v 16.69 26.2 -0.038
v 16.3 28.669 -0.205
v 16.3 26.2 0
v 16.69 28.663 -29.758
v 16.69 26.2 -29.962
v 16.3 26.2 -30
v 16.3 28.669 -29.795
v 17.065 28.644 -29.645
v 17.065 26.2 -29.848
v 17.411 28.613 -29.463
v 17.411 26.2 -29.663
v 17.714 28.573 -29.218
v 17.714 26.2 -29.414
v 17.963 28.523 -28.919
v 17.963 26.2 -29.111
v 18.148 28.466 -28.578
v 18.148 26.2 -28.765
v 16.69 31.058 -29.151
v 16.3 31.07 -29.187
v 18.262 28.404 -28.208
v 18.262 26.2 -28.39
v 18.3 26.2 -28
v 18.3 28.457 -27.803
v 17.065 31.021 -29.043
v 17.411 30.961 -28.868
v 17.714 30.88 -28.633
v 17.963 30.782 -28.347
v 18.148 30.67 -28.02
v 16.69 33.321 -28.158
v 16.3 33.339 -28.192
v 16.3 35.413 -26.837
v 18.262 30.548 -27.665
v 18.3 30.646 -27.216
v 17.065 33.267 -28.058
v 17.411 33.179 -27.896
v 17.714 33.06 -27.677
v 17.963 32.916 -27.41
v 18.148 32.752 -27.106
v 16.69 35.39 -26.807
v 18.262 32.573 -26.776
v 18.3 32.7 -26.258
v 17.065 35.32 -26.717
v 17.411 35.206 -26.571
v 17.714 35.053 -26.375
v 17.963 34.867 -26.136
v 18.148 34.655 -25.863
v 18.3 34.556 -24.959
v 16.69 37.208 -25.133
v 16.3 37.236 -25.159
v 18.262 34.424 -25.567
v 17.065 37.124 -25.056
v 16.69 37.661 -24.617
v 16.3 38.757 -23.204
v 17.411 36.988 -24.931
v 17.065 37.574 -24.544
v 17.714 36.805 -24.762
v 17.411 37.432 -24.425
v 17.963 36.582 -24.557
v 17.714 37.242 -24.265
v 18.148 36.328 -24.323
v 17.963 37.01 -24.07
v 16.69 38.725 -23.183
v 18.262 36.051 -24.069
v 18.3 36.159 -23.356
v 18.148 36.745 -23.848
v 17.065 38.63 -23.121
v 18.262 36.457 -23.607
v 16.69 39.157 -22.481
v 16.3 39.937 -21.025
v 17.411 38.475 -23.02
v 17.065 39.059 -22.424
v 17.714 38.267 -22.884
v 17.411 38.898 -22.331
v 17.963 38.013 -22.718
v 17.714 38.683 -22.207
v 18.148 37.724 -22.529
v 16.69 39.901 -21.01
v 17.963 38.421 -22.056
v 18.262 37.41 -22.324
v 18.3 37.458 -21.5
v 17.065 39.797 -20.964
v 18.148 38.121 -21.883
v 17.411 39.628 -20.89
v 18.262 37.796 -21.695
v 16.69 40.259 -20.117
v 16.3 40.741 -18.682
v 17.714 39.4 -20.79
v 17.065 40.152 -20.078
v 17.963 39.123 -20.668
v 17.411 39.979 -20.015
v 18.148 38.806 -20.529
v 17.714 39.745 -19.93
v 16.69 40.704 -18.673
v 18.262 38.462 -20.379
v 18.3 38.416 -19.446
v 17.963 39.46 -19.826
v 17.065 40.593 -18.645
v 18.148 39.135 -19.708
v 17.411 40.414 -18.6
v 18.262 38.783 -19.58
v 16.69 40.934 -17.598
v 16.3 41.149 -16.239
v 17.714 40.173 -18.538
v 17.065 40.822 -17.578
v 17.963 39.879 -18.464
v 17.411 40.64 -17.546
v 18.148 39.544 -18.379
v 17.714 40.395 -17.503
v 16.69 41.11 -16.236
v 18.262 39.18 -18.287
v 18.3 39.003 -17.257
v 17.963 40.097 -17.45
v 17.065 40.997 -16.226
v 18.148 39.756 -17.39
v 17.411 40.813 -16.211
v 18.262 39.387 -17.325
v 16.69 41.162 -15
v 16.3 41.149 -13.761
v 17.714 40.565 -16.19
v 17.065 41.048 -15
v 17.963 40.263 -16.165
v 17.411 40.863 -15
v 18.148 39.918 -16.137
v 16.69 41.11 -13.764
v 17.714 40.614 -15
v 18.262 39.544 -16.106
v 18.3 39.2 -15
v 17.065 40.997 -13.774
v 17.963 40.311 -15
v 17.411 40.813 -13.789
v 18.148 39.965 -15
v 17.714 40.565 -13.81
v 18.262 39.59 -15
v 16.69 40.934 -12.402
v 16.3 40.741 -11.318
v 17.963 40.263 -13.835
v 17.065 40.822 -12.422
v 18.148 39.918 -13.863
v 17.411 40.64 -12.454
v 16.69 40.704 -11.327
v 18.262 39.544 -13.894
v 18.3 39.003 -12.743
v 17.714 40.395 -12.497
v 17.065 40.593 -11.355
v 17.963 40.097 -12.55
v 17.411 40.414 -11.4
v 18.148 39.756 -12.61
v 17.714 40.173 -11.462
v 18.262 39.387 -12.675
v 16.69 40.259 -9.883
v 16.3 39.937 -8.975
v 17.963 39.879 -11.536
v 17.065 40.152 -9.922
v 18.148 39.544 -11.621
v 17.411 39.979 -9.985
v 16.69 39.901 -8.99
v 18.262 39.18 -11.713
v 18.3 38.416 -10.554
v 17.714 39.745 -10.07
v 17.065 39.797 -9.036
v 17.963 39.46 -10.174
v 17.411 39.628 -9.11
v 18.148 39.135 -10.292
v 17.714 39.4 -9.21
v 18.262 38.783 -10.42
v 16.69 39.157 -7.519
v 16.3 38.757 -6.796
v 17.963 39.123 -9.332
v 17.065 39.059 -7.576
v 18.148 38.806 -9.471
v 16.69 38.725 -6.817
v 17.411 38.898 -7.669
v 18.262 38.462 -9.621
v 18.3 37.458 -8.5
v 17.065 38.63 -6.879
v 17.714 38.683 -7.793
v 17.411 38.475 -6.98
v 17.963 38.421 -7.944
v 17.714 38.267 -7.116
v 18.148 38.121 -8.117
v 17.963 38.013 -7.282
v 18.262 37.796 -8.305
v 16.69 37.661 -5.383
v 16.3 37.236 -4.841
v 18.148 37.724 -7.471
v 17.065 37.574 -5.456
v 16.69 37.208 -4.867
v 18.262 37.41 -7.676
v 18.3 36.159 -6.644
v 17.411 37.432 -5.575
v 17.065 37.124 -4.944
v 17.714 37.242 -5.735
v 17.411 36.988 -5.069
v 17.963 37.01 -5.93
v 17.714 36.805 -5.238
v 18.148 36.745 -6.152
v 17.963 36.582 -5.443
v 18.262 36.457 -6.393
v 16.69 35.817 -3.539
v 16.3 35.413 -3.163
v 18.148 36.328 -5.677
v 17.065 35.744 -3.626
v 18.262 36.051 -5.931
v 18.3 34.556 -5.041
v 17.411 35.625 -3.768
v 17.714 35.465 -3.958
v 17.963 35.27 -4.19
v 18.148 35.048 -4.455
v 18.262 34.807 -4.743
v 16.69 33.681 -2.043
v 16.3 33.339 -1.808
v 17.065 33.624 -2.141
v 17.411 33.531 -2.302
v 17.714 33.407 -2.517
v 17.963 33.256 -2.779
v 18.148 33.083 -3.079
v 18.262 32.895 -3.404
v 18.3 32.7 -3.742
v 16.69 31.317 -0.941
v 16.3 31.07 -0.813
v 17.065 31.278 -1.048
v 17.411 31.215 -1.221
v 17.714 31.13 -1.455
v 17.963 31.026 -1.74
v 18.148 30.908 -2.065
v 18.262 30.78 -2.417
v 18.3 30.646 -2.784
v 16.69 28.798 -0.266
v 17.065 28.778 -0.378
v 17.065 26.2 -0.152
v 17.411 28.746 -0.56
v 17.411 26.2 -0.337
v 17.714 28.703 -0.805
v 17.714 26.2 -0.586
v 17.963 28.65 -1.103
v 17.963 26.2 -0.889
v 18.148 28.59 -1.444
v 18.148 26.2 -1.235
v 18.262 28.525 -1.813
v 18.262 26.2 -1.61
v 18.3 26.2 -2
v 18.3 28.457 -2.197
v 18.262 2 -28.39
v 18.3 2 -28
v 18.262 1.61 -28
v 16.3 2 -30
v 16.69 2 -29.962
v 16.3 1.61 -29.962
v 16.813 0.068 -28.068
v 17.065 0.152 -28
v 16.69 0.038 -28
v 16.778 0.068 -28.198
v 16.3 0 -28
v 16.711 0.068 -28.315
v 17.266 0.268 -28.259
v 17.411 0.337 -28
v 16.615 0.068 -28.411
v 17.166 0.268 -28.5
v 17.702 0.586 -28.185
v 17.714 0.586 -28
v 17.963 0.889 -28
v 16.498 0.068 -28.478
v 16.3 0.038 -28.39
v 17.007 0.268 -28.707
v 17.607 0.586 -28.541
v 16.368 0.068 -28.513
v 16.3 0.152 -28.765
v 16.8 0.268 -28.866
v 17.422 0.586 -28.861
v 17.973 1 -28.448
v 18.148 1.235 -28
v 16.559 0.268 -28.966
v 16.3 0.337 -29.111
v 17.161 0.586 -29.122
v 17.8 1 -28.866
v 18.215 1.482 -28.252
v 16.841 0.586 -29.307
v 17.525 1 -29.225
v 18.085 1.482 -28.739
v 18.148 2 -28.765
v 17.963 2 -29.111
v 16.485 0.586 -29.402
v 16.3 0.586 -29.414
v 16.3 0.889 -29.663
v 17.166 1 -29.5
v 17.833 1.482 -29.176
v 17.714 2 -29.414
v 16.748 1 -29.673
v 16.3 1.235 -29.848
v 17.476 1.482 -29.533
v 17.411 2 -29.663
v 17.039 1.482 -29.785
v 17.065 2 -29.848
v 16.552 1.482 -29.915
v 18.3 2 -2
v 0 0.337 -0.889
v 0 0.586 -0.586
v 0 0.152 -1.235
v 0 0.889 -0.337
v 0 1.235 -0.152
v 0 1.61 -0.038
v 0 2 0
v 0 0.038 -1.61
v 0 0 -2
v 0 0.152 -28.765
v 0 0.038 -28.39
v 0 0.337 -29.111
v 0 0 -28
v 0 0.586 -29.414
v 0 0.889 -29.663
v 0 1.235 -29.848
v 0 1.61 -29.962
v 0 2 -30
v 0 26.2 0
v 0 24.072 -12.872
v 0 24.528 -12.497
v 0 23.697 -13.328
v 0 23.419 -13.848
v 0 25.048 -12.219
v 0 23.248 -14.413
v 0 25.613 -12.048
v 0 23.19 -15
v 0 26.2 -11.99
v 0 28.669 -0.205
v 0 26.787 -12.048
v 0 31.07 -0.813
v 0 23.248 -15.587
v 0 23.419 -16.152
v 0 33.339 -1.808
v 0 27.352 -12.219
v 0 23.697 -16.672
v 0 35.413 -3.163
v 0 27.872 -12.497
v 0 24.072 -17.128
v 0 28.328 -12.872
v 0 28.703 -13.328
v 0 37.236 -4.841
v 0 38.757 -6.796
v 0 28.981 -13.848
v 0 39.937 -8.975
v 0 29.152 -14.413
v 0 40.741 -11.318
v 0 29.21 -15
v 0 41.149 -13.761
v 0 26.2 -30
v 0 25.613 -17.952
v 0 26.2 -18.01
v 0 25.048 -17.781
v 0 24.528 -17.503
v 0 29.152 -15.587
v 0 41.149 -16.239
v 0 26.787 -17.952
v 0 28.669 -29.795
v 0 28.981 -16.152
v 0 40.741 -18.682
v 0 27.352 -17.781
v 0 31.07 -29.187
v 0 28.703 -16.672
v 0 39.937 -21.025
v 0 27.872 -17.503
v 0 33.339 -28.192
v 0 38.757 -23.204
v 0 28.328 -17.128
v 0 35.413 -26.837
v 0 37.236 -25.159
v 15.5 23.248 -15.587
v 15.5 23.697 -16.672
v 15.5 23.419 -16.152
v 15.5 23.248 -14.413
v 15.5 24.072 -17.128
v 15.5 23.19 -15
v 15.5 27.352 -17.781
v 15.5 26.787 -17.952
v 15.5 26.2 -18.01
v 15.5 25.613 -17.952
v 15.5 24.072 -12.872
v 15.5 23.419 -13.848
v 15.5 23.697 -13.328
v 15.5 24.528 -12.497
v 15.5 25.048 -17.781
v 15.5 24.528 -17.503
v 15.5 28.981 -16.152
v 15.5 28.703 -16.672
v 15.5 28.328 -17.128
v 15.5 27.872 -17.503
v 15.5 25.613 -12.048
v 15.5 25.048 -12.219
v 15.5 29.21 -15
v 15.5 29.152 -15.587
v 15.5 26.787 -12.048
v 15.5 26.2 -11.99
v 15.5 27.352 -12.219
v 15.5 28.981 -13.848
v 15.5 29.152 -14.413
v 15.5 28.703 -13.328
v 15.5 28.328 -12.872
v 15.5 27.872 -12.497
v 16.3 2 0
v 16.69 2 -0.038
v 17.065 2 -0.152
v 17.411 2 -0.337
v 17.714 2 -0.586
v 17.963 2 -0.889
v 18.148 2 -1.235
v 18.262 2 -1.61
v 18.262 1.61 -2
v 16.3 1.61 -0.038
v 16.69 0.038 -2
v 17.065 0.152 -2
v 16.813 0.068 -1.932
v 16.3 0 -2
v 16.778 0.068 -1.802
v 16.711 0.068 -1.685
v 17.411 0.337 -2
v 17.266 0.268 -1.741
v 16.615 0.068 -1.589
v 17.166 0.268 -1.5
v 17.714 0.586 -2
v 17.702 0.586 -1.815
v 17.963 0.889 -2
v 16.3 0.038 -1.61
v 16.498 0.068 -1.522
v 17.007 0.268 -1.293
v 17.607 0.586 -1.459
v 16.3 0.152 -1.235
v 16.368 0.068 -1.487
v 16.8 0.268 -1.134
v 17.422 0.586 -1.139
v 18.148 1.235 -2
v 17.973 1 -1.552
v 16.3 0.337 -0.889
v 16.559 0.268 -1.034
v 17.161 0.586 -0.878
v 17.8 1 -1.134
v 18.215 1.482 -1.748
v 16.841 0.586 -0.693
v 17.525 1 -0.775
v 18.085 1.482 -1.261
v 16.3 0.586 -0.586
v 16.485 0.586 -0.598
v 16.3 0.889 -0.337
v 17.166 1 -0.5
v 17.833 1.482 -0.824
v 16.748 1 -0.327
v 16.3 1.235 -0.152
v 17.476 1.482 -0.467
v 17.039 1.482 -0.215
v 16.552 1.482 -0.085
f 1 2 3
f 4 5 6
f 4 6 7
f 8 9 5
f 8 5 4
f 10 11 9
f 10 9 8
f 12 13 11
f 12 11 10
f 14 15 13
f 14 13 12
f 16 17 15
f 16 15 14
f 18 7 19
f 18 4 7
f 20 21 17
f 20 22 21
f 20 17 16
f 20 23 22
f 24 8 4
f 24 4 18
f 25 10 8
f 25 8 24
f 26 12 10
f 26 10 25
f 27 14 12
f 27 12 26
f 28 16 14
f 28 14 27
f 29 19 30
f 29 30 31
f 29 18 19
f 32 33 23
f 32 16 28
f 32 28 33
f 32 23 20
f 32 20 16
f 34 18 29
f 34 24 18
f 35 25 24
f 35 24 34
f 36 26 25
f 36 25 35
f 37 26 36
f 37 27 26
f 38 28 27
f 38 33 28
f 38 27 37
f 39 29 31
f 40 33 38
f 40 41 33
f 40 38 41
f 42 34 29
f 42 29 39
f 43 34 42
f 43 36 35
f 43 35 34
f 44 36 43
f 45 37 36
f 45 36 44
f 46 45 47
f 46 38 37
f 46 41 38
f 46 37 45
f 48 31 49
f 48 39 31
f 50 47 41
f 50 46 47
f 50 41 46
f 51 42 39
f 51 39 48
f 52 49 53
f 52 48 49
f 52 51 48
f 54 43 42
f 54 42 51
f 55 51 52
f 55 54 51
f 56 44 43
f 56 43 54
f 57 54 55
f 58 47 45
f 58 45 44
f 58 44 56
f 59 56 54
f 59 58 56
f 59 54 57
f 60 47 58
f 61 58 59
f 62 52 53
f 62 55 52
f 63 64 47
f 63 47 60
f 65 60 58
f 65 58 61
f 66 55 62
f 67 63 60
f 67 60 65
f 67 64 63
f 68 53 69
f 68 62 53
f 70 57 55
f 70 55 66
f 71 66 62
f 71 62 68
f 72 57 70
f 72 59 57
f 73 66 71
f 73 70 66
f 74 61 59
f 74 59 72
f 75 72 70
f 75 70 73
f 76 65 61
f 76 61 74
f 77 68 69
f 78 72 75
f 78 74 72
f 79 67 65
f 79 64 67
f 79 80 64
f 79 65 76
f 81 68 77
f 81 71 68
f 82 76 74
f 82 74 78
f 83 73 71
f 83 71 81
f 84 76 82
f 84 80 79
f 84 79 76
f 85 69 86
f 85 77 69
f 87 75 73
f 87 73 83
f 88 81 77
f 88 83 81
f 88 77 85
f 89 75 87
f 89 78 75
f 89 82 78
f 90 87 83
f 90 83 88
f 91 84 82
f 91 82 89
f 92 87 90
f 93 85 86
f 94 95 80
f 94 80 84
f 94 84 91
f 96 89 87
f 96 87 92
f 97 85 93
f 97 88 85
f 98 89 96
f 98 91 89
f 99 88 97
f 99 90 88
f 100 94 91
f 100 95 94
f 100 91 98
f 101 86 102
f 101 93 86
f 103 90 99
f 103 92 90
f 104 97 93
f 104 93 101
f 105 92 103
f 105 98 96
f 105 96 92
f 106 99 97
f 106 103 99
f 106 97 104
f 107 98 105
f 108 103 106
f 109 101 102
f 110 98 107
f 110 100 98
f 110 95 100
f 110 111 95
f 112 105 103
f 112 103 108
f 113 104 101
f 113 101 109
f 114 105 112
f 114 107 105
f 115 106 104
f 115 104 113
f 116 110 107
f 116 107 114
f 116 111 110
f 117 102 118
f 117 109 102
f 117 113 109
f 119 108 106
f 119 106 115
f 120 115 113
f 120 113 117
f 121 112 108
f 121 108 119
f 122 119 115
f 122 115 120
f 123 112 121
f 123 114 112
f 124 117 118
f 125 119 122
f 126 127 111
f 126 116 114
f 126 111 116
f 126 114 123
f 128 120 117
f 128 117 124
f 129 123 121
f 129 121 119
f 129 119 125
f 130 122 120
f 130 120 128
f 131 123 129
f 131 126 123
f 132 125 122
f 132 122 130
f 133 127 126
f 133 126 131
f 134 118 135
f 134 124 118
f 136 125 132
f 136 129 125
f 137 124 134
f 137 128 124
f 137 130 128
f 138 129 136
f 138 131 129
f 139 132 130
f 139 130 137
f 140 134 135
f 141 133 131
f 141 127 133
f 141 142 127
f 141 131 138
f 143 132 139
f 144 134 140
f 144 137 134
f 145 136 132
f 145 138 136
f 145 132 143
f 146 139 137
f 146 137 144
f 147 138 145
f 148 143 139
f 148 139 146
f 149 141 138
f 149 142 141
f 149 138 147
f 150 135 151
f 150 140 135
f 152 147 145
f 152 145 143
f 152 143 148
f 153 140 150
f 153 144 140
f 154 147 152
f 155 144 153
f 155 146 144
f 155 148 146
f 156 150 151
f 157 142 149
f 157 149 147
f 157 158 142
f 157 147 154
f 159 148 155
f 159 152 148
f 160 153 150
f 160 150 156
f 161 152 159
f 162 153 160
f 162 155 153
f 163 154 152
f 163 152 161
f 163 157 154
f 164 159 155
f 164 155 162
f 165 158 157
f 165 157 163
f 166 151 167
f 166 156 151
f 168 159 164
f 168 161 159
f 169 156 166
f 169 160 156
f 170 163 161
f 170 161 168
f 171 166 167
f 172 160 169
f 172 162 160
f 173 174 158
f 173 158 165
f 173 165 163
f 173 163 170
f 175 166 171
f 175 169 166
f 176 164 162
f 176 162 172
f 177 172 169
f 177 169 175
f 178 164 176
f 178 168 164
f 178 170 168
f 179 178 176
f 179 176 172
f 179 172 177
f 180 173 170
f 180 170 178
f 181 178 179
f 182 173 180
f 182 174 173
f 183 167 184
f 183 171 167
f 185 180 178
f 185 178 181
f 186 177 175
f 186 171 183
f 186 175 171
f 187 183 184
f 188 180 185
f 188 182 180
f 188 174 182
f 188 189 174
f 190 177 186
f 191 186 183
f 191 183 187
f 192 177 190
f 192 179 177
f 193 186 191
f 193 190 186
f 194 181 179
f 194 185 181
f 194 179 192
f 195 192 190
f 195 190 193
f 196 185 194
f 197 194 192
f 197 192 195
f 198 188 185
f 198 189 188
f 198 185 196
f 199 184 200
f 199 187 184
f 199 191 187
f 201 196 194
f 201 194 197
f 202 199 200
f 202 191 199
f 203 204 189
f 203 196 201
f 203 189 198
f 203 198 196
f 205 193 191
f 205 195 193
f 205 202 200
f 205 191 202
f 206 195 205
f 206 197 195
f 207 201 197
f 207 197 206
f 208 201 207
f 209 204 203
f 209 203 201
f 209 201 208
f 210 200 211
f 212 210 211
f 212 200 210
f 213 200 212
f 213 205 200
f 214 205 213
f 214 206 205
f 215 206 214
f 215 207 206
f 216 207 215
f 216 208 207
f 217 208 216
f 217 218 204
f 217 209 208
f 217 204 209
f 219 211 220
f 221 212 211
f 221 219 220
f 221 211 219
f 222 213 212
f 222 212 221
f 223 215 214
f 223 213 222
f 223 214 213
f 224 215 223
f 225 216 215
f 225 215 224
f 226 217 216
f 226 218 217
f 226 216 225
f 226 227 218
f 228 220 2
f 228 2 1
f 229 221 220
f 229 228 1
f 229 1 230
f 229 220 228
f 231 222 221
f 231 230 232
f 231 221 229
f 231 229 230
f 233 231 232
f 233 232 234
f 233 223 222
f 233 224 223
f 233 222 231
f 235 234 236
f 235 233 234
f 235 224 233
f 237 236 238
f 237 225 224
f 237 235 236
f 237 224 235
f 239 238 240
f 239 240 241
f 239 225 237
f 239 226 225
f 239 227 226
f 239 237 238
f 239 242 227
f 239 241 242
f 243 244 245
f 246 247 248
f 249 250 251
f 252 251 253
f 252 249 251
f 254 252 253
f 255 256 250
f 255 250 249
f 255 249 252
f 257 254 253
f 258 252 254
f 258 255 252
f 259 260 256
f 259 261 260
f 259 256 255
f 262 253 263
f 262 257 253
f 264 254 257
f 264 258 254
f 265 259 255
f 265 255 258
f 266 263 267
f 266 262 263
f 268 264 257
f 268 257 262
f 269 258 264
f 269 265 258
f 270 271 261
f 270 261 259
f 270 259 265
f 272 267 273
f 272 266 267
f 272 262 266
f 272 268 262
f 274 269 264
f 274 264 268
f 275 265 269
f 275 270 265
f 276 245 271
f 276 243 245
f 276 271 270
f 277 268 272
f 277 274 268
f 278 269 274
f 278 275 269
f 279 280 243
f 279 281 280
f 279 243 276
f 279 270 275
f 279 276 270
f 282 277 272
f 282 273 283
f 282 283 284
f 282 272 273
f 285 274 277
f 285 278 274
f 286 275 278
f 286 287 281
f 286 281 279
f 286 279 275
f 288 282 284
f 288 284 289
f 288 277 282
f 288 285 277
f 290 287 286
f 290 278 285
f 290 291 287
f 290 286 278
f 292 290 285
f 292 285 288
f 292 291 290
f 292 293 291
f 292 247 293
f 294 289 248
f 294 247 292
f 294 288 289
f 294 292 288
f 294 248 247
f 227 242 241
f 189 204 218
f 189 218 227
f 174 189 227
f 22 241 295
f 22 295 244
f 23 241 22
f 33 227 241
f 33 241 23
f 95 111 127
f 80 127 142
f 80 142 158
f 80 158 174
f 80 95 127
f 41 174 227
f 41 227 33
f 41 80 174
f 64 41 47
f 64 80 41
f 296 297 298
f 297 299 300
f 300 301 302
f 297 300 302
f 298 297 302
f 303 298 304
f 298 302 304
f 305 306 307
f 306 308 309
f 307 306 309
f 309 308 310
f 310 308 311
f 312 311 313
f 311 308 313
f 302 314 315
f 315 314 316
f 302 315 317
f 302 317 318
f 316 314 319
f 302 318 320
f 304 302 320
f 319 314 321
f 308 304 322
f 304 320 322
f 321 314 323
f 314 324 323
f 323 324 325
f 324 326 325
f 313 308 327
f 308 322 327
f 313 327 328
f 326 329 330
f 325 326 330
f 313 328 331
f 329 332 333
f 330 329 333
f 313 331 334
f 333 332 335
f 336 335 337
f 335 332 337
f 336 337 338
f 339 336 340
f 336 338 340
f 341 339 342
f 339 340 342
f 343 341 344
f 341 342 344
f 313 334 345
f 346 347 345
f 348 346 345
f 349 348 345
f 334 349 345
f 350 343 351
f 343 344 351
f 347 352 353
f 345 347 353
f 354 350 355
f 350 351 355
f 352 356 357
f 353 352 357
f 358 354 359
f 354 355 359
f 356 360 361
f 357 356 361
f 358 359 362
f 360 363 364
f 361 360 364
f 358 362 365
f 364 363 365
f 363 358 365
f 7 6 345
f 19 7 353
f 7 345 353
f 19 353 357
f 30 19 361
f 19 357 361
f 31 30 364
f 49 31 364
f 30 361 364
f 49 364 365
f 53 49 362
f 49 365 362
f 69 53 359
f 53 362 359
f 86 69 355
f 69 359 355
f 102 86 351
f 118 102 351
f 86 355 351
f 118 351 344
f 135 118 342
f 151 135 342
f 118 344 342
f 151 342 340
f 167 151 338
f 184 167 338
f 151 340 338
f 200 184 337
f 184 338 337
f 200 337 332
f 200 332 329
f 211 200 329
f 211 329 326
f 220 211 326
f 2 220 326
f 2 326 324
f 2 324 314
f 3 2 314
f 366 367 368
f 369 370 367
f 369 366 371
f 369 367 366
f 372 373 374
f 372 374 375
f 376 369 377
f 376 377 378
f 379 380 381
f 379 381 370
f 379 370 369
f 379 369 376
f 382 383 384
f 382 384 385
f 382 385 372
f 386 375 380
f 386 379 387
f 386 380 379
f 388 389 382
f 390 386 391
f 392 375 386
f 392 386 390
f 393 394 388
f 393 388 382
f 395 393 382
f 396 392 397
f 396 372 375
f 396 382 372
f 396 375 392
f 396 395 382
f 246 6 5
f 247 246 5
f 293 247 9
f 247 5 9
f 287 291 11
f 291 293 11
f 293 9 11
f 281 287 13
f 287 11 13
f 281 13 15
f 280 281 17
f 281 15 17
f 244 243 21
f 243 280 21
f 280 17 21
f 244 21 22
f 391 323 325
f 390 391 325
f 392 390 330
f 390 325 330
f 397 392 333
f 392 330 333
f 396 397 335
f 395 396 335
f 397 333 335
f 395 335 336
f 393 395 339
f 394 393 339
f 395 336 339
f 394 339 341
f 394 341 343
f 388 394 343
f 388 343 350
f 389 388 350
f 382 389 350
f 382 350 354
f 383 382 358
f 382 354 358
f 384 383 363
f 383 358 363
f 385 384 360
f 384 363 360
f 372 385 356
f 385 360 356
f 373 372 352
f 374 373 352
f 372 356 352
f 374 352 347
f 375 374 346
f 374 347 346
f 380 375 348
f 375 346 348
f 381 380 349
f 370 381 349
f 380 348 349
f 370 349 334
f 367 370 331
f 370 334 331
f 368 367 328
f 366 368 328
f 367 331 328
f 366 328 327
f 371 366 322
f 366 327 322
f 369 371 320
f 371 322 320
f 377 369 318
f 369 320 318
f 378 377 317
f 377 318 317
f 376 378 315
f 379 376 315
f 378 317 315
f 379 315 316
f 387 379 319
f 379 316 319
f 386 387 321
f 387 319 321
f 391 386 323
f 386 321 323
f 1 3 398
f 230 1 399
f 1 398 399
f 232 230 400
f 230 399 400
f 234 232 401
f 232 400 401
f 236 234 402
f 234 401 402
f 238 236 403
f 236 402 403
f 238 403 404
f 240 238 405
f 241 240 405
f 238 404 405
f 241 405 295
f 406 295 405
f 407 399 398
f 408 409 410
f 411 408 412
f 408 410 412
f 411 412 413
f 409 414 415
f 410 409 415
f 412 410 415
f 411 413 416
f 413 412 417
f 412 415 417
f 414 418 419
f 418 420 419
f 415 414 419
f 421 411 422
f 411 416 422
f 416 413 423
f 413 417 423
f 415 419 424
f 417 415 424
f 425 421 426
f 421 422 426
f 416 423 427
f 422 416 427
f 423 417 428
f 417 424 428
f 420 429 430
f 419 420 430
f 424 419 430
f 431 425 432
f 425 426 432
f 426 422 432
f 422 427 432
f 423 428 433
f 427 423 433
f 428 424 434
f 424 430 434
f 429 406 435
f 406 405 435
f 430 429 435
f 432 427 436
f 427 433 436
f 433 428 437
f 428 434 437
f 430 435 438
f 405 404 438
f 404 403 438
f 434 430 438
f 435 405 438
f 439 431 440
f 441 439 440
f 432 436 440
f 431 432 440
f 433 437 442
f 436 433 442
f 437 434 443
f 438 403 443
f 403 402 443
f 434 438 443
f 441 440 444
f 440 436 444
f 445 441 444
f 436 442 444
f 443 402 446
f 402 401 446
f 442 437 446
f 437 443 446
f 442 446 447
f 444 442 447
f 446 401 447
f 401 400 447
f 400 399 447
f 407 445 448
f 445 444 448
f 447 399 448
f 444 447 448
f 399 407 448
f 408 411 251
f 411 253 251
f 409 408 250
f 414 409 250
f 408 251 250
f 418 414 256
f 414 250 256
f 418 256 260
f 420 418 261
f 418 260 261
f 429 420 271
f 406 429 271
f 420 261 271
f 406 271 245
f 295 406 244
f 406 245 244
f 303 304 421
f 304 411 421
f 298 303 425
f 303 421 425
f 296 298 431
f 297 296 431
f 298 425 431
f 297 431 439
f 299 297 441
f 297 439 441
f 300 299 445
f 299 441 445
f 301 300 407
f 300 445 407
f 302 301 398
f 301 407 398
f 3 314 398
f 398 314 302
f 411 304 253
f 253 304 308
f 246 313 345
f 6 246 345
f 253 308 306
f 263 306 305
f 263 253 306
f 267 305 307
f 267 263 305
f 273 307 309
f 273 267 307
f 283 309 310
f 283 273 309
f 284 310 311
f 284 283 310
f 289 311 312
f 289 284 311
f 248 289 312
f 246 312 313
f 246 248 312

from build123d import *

# Parameters (mm, degrees)
EXTRUDE1_DEPTH     = 18.3
SKETCH2_R          = 3.01
CUT_EXTRUDE1_DEPTH = 15.5
FILLET1_R          = 2


with BuildPart() as part:
    # Sketch1 → Extrude1 (new body)
    with BuildSketch(Plane(origin=(0, 0, 0), x_dir=(0, 0, -1), z_dir=(1, 0, 0))):
        with BuildLine():
            Line((0, 0), (30, 0))
            Line((30, 0), (30, 26.2))
            ThreePointArc((30, 26.2), (15, 41.2), (0, 26.2))
            Line((0, 26.2), (0, 0))
        make_face()
    extrude(amount=EXTRUDE1_DEPTH)

    # Sketch2 → Cut-Extrude1 (cut)
    with BuildSketch(Plane.ZY):
        with Locations((-15, 26.2)):
            Circle(SKETCH2_R)
    extrude(amount=-CUT_EXTRUDE1_DEPTH, mode=Mode.SUBTRACT)

    # Fillet1
    fillet1_edges = [part.edges().sort_by_distance(p)[0] for p in [
        (18.3, 13.1, -30),
        (18.3, 41.2, -15),
        (18.3, 13.1, 0),
        (18.3, 0, -15),
        (9.15, 0, -30),
        (9.15, 0, 0),
    ]]
    fillet(fillet1_edges, radius=FILLET1_R)


solid = part.part
